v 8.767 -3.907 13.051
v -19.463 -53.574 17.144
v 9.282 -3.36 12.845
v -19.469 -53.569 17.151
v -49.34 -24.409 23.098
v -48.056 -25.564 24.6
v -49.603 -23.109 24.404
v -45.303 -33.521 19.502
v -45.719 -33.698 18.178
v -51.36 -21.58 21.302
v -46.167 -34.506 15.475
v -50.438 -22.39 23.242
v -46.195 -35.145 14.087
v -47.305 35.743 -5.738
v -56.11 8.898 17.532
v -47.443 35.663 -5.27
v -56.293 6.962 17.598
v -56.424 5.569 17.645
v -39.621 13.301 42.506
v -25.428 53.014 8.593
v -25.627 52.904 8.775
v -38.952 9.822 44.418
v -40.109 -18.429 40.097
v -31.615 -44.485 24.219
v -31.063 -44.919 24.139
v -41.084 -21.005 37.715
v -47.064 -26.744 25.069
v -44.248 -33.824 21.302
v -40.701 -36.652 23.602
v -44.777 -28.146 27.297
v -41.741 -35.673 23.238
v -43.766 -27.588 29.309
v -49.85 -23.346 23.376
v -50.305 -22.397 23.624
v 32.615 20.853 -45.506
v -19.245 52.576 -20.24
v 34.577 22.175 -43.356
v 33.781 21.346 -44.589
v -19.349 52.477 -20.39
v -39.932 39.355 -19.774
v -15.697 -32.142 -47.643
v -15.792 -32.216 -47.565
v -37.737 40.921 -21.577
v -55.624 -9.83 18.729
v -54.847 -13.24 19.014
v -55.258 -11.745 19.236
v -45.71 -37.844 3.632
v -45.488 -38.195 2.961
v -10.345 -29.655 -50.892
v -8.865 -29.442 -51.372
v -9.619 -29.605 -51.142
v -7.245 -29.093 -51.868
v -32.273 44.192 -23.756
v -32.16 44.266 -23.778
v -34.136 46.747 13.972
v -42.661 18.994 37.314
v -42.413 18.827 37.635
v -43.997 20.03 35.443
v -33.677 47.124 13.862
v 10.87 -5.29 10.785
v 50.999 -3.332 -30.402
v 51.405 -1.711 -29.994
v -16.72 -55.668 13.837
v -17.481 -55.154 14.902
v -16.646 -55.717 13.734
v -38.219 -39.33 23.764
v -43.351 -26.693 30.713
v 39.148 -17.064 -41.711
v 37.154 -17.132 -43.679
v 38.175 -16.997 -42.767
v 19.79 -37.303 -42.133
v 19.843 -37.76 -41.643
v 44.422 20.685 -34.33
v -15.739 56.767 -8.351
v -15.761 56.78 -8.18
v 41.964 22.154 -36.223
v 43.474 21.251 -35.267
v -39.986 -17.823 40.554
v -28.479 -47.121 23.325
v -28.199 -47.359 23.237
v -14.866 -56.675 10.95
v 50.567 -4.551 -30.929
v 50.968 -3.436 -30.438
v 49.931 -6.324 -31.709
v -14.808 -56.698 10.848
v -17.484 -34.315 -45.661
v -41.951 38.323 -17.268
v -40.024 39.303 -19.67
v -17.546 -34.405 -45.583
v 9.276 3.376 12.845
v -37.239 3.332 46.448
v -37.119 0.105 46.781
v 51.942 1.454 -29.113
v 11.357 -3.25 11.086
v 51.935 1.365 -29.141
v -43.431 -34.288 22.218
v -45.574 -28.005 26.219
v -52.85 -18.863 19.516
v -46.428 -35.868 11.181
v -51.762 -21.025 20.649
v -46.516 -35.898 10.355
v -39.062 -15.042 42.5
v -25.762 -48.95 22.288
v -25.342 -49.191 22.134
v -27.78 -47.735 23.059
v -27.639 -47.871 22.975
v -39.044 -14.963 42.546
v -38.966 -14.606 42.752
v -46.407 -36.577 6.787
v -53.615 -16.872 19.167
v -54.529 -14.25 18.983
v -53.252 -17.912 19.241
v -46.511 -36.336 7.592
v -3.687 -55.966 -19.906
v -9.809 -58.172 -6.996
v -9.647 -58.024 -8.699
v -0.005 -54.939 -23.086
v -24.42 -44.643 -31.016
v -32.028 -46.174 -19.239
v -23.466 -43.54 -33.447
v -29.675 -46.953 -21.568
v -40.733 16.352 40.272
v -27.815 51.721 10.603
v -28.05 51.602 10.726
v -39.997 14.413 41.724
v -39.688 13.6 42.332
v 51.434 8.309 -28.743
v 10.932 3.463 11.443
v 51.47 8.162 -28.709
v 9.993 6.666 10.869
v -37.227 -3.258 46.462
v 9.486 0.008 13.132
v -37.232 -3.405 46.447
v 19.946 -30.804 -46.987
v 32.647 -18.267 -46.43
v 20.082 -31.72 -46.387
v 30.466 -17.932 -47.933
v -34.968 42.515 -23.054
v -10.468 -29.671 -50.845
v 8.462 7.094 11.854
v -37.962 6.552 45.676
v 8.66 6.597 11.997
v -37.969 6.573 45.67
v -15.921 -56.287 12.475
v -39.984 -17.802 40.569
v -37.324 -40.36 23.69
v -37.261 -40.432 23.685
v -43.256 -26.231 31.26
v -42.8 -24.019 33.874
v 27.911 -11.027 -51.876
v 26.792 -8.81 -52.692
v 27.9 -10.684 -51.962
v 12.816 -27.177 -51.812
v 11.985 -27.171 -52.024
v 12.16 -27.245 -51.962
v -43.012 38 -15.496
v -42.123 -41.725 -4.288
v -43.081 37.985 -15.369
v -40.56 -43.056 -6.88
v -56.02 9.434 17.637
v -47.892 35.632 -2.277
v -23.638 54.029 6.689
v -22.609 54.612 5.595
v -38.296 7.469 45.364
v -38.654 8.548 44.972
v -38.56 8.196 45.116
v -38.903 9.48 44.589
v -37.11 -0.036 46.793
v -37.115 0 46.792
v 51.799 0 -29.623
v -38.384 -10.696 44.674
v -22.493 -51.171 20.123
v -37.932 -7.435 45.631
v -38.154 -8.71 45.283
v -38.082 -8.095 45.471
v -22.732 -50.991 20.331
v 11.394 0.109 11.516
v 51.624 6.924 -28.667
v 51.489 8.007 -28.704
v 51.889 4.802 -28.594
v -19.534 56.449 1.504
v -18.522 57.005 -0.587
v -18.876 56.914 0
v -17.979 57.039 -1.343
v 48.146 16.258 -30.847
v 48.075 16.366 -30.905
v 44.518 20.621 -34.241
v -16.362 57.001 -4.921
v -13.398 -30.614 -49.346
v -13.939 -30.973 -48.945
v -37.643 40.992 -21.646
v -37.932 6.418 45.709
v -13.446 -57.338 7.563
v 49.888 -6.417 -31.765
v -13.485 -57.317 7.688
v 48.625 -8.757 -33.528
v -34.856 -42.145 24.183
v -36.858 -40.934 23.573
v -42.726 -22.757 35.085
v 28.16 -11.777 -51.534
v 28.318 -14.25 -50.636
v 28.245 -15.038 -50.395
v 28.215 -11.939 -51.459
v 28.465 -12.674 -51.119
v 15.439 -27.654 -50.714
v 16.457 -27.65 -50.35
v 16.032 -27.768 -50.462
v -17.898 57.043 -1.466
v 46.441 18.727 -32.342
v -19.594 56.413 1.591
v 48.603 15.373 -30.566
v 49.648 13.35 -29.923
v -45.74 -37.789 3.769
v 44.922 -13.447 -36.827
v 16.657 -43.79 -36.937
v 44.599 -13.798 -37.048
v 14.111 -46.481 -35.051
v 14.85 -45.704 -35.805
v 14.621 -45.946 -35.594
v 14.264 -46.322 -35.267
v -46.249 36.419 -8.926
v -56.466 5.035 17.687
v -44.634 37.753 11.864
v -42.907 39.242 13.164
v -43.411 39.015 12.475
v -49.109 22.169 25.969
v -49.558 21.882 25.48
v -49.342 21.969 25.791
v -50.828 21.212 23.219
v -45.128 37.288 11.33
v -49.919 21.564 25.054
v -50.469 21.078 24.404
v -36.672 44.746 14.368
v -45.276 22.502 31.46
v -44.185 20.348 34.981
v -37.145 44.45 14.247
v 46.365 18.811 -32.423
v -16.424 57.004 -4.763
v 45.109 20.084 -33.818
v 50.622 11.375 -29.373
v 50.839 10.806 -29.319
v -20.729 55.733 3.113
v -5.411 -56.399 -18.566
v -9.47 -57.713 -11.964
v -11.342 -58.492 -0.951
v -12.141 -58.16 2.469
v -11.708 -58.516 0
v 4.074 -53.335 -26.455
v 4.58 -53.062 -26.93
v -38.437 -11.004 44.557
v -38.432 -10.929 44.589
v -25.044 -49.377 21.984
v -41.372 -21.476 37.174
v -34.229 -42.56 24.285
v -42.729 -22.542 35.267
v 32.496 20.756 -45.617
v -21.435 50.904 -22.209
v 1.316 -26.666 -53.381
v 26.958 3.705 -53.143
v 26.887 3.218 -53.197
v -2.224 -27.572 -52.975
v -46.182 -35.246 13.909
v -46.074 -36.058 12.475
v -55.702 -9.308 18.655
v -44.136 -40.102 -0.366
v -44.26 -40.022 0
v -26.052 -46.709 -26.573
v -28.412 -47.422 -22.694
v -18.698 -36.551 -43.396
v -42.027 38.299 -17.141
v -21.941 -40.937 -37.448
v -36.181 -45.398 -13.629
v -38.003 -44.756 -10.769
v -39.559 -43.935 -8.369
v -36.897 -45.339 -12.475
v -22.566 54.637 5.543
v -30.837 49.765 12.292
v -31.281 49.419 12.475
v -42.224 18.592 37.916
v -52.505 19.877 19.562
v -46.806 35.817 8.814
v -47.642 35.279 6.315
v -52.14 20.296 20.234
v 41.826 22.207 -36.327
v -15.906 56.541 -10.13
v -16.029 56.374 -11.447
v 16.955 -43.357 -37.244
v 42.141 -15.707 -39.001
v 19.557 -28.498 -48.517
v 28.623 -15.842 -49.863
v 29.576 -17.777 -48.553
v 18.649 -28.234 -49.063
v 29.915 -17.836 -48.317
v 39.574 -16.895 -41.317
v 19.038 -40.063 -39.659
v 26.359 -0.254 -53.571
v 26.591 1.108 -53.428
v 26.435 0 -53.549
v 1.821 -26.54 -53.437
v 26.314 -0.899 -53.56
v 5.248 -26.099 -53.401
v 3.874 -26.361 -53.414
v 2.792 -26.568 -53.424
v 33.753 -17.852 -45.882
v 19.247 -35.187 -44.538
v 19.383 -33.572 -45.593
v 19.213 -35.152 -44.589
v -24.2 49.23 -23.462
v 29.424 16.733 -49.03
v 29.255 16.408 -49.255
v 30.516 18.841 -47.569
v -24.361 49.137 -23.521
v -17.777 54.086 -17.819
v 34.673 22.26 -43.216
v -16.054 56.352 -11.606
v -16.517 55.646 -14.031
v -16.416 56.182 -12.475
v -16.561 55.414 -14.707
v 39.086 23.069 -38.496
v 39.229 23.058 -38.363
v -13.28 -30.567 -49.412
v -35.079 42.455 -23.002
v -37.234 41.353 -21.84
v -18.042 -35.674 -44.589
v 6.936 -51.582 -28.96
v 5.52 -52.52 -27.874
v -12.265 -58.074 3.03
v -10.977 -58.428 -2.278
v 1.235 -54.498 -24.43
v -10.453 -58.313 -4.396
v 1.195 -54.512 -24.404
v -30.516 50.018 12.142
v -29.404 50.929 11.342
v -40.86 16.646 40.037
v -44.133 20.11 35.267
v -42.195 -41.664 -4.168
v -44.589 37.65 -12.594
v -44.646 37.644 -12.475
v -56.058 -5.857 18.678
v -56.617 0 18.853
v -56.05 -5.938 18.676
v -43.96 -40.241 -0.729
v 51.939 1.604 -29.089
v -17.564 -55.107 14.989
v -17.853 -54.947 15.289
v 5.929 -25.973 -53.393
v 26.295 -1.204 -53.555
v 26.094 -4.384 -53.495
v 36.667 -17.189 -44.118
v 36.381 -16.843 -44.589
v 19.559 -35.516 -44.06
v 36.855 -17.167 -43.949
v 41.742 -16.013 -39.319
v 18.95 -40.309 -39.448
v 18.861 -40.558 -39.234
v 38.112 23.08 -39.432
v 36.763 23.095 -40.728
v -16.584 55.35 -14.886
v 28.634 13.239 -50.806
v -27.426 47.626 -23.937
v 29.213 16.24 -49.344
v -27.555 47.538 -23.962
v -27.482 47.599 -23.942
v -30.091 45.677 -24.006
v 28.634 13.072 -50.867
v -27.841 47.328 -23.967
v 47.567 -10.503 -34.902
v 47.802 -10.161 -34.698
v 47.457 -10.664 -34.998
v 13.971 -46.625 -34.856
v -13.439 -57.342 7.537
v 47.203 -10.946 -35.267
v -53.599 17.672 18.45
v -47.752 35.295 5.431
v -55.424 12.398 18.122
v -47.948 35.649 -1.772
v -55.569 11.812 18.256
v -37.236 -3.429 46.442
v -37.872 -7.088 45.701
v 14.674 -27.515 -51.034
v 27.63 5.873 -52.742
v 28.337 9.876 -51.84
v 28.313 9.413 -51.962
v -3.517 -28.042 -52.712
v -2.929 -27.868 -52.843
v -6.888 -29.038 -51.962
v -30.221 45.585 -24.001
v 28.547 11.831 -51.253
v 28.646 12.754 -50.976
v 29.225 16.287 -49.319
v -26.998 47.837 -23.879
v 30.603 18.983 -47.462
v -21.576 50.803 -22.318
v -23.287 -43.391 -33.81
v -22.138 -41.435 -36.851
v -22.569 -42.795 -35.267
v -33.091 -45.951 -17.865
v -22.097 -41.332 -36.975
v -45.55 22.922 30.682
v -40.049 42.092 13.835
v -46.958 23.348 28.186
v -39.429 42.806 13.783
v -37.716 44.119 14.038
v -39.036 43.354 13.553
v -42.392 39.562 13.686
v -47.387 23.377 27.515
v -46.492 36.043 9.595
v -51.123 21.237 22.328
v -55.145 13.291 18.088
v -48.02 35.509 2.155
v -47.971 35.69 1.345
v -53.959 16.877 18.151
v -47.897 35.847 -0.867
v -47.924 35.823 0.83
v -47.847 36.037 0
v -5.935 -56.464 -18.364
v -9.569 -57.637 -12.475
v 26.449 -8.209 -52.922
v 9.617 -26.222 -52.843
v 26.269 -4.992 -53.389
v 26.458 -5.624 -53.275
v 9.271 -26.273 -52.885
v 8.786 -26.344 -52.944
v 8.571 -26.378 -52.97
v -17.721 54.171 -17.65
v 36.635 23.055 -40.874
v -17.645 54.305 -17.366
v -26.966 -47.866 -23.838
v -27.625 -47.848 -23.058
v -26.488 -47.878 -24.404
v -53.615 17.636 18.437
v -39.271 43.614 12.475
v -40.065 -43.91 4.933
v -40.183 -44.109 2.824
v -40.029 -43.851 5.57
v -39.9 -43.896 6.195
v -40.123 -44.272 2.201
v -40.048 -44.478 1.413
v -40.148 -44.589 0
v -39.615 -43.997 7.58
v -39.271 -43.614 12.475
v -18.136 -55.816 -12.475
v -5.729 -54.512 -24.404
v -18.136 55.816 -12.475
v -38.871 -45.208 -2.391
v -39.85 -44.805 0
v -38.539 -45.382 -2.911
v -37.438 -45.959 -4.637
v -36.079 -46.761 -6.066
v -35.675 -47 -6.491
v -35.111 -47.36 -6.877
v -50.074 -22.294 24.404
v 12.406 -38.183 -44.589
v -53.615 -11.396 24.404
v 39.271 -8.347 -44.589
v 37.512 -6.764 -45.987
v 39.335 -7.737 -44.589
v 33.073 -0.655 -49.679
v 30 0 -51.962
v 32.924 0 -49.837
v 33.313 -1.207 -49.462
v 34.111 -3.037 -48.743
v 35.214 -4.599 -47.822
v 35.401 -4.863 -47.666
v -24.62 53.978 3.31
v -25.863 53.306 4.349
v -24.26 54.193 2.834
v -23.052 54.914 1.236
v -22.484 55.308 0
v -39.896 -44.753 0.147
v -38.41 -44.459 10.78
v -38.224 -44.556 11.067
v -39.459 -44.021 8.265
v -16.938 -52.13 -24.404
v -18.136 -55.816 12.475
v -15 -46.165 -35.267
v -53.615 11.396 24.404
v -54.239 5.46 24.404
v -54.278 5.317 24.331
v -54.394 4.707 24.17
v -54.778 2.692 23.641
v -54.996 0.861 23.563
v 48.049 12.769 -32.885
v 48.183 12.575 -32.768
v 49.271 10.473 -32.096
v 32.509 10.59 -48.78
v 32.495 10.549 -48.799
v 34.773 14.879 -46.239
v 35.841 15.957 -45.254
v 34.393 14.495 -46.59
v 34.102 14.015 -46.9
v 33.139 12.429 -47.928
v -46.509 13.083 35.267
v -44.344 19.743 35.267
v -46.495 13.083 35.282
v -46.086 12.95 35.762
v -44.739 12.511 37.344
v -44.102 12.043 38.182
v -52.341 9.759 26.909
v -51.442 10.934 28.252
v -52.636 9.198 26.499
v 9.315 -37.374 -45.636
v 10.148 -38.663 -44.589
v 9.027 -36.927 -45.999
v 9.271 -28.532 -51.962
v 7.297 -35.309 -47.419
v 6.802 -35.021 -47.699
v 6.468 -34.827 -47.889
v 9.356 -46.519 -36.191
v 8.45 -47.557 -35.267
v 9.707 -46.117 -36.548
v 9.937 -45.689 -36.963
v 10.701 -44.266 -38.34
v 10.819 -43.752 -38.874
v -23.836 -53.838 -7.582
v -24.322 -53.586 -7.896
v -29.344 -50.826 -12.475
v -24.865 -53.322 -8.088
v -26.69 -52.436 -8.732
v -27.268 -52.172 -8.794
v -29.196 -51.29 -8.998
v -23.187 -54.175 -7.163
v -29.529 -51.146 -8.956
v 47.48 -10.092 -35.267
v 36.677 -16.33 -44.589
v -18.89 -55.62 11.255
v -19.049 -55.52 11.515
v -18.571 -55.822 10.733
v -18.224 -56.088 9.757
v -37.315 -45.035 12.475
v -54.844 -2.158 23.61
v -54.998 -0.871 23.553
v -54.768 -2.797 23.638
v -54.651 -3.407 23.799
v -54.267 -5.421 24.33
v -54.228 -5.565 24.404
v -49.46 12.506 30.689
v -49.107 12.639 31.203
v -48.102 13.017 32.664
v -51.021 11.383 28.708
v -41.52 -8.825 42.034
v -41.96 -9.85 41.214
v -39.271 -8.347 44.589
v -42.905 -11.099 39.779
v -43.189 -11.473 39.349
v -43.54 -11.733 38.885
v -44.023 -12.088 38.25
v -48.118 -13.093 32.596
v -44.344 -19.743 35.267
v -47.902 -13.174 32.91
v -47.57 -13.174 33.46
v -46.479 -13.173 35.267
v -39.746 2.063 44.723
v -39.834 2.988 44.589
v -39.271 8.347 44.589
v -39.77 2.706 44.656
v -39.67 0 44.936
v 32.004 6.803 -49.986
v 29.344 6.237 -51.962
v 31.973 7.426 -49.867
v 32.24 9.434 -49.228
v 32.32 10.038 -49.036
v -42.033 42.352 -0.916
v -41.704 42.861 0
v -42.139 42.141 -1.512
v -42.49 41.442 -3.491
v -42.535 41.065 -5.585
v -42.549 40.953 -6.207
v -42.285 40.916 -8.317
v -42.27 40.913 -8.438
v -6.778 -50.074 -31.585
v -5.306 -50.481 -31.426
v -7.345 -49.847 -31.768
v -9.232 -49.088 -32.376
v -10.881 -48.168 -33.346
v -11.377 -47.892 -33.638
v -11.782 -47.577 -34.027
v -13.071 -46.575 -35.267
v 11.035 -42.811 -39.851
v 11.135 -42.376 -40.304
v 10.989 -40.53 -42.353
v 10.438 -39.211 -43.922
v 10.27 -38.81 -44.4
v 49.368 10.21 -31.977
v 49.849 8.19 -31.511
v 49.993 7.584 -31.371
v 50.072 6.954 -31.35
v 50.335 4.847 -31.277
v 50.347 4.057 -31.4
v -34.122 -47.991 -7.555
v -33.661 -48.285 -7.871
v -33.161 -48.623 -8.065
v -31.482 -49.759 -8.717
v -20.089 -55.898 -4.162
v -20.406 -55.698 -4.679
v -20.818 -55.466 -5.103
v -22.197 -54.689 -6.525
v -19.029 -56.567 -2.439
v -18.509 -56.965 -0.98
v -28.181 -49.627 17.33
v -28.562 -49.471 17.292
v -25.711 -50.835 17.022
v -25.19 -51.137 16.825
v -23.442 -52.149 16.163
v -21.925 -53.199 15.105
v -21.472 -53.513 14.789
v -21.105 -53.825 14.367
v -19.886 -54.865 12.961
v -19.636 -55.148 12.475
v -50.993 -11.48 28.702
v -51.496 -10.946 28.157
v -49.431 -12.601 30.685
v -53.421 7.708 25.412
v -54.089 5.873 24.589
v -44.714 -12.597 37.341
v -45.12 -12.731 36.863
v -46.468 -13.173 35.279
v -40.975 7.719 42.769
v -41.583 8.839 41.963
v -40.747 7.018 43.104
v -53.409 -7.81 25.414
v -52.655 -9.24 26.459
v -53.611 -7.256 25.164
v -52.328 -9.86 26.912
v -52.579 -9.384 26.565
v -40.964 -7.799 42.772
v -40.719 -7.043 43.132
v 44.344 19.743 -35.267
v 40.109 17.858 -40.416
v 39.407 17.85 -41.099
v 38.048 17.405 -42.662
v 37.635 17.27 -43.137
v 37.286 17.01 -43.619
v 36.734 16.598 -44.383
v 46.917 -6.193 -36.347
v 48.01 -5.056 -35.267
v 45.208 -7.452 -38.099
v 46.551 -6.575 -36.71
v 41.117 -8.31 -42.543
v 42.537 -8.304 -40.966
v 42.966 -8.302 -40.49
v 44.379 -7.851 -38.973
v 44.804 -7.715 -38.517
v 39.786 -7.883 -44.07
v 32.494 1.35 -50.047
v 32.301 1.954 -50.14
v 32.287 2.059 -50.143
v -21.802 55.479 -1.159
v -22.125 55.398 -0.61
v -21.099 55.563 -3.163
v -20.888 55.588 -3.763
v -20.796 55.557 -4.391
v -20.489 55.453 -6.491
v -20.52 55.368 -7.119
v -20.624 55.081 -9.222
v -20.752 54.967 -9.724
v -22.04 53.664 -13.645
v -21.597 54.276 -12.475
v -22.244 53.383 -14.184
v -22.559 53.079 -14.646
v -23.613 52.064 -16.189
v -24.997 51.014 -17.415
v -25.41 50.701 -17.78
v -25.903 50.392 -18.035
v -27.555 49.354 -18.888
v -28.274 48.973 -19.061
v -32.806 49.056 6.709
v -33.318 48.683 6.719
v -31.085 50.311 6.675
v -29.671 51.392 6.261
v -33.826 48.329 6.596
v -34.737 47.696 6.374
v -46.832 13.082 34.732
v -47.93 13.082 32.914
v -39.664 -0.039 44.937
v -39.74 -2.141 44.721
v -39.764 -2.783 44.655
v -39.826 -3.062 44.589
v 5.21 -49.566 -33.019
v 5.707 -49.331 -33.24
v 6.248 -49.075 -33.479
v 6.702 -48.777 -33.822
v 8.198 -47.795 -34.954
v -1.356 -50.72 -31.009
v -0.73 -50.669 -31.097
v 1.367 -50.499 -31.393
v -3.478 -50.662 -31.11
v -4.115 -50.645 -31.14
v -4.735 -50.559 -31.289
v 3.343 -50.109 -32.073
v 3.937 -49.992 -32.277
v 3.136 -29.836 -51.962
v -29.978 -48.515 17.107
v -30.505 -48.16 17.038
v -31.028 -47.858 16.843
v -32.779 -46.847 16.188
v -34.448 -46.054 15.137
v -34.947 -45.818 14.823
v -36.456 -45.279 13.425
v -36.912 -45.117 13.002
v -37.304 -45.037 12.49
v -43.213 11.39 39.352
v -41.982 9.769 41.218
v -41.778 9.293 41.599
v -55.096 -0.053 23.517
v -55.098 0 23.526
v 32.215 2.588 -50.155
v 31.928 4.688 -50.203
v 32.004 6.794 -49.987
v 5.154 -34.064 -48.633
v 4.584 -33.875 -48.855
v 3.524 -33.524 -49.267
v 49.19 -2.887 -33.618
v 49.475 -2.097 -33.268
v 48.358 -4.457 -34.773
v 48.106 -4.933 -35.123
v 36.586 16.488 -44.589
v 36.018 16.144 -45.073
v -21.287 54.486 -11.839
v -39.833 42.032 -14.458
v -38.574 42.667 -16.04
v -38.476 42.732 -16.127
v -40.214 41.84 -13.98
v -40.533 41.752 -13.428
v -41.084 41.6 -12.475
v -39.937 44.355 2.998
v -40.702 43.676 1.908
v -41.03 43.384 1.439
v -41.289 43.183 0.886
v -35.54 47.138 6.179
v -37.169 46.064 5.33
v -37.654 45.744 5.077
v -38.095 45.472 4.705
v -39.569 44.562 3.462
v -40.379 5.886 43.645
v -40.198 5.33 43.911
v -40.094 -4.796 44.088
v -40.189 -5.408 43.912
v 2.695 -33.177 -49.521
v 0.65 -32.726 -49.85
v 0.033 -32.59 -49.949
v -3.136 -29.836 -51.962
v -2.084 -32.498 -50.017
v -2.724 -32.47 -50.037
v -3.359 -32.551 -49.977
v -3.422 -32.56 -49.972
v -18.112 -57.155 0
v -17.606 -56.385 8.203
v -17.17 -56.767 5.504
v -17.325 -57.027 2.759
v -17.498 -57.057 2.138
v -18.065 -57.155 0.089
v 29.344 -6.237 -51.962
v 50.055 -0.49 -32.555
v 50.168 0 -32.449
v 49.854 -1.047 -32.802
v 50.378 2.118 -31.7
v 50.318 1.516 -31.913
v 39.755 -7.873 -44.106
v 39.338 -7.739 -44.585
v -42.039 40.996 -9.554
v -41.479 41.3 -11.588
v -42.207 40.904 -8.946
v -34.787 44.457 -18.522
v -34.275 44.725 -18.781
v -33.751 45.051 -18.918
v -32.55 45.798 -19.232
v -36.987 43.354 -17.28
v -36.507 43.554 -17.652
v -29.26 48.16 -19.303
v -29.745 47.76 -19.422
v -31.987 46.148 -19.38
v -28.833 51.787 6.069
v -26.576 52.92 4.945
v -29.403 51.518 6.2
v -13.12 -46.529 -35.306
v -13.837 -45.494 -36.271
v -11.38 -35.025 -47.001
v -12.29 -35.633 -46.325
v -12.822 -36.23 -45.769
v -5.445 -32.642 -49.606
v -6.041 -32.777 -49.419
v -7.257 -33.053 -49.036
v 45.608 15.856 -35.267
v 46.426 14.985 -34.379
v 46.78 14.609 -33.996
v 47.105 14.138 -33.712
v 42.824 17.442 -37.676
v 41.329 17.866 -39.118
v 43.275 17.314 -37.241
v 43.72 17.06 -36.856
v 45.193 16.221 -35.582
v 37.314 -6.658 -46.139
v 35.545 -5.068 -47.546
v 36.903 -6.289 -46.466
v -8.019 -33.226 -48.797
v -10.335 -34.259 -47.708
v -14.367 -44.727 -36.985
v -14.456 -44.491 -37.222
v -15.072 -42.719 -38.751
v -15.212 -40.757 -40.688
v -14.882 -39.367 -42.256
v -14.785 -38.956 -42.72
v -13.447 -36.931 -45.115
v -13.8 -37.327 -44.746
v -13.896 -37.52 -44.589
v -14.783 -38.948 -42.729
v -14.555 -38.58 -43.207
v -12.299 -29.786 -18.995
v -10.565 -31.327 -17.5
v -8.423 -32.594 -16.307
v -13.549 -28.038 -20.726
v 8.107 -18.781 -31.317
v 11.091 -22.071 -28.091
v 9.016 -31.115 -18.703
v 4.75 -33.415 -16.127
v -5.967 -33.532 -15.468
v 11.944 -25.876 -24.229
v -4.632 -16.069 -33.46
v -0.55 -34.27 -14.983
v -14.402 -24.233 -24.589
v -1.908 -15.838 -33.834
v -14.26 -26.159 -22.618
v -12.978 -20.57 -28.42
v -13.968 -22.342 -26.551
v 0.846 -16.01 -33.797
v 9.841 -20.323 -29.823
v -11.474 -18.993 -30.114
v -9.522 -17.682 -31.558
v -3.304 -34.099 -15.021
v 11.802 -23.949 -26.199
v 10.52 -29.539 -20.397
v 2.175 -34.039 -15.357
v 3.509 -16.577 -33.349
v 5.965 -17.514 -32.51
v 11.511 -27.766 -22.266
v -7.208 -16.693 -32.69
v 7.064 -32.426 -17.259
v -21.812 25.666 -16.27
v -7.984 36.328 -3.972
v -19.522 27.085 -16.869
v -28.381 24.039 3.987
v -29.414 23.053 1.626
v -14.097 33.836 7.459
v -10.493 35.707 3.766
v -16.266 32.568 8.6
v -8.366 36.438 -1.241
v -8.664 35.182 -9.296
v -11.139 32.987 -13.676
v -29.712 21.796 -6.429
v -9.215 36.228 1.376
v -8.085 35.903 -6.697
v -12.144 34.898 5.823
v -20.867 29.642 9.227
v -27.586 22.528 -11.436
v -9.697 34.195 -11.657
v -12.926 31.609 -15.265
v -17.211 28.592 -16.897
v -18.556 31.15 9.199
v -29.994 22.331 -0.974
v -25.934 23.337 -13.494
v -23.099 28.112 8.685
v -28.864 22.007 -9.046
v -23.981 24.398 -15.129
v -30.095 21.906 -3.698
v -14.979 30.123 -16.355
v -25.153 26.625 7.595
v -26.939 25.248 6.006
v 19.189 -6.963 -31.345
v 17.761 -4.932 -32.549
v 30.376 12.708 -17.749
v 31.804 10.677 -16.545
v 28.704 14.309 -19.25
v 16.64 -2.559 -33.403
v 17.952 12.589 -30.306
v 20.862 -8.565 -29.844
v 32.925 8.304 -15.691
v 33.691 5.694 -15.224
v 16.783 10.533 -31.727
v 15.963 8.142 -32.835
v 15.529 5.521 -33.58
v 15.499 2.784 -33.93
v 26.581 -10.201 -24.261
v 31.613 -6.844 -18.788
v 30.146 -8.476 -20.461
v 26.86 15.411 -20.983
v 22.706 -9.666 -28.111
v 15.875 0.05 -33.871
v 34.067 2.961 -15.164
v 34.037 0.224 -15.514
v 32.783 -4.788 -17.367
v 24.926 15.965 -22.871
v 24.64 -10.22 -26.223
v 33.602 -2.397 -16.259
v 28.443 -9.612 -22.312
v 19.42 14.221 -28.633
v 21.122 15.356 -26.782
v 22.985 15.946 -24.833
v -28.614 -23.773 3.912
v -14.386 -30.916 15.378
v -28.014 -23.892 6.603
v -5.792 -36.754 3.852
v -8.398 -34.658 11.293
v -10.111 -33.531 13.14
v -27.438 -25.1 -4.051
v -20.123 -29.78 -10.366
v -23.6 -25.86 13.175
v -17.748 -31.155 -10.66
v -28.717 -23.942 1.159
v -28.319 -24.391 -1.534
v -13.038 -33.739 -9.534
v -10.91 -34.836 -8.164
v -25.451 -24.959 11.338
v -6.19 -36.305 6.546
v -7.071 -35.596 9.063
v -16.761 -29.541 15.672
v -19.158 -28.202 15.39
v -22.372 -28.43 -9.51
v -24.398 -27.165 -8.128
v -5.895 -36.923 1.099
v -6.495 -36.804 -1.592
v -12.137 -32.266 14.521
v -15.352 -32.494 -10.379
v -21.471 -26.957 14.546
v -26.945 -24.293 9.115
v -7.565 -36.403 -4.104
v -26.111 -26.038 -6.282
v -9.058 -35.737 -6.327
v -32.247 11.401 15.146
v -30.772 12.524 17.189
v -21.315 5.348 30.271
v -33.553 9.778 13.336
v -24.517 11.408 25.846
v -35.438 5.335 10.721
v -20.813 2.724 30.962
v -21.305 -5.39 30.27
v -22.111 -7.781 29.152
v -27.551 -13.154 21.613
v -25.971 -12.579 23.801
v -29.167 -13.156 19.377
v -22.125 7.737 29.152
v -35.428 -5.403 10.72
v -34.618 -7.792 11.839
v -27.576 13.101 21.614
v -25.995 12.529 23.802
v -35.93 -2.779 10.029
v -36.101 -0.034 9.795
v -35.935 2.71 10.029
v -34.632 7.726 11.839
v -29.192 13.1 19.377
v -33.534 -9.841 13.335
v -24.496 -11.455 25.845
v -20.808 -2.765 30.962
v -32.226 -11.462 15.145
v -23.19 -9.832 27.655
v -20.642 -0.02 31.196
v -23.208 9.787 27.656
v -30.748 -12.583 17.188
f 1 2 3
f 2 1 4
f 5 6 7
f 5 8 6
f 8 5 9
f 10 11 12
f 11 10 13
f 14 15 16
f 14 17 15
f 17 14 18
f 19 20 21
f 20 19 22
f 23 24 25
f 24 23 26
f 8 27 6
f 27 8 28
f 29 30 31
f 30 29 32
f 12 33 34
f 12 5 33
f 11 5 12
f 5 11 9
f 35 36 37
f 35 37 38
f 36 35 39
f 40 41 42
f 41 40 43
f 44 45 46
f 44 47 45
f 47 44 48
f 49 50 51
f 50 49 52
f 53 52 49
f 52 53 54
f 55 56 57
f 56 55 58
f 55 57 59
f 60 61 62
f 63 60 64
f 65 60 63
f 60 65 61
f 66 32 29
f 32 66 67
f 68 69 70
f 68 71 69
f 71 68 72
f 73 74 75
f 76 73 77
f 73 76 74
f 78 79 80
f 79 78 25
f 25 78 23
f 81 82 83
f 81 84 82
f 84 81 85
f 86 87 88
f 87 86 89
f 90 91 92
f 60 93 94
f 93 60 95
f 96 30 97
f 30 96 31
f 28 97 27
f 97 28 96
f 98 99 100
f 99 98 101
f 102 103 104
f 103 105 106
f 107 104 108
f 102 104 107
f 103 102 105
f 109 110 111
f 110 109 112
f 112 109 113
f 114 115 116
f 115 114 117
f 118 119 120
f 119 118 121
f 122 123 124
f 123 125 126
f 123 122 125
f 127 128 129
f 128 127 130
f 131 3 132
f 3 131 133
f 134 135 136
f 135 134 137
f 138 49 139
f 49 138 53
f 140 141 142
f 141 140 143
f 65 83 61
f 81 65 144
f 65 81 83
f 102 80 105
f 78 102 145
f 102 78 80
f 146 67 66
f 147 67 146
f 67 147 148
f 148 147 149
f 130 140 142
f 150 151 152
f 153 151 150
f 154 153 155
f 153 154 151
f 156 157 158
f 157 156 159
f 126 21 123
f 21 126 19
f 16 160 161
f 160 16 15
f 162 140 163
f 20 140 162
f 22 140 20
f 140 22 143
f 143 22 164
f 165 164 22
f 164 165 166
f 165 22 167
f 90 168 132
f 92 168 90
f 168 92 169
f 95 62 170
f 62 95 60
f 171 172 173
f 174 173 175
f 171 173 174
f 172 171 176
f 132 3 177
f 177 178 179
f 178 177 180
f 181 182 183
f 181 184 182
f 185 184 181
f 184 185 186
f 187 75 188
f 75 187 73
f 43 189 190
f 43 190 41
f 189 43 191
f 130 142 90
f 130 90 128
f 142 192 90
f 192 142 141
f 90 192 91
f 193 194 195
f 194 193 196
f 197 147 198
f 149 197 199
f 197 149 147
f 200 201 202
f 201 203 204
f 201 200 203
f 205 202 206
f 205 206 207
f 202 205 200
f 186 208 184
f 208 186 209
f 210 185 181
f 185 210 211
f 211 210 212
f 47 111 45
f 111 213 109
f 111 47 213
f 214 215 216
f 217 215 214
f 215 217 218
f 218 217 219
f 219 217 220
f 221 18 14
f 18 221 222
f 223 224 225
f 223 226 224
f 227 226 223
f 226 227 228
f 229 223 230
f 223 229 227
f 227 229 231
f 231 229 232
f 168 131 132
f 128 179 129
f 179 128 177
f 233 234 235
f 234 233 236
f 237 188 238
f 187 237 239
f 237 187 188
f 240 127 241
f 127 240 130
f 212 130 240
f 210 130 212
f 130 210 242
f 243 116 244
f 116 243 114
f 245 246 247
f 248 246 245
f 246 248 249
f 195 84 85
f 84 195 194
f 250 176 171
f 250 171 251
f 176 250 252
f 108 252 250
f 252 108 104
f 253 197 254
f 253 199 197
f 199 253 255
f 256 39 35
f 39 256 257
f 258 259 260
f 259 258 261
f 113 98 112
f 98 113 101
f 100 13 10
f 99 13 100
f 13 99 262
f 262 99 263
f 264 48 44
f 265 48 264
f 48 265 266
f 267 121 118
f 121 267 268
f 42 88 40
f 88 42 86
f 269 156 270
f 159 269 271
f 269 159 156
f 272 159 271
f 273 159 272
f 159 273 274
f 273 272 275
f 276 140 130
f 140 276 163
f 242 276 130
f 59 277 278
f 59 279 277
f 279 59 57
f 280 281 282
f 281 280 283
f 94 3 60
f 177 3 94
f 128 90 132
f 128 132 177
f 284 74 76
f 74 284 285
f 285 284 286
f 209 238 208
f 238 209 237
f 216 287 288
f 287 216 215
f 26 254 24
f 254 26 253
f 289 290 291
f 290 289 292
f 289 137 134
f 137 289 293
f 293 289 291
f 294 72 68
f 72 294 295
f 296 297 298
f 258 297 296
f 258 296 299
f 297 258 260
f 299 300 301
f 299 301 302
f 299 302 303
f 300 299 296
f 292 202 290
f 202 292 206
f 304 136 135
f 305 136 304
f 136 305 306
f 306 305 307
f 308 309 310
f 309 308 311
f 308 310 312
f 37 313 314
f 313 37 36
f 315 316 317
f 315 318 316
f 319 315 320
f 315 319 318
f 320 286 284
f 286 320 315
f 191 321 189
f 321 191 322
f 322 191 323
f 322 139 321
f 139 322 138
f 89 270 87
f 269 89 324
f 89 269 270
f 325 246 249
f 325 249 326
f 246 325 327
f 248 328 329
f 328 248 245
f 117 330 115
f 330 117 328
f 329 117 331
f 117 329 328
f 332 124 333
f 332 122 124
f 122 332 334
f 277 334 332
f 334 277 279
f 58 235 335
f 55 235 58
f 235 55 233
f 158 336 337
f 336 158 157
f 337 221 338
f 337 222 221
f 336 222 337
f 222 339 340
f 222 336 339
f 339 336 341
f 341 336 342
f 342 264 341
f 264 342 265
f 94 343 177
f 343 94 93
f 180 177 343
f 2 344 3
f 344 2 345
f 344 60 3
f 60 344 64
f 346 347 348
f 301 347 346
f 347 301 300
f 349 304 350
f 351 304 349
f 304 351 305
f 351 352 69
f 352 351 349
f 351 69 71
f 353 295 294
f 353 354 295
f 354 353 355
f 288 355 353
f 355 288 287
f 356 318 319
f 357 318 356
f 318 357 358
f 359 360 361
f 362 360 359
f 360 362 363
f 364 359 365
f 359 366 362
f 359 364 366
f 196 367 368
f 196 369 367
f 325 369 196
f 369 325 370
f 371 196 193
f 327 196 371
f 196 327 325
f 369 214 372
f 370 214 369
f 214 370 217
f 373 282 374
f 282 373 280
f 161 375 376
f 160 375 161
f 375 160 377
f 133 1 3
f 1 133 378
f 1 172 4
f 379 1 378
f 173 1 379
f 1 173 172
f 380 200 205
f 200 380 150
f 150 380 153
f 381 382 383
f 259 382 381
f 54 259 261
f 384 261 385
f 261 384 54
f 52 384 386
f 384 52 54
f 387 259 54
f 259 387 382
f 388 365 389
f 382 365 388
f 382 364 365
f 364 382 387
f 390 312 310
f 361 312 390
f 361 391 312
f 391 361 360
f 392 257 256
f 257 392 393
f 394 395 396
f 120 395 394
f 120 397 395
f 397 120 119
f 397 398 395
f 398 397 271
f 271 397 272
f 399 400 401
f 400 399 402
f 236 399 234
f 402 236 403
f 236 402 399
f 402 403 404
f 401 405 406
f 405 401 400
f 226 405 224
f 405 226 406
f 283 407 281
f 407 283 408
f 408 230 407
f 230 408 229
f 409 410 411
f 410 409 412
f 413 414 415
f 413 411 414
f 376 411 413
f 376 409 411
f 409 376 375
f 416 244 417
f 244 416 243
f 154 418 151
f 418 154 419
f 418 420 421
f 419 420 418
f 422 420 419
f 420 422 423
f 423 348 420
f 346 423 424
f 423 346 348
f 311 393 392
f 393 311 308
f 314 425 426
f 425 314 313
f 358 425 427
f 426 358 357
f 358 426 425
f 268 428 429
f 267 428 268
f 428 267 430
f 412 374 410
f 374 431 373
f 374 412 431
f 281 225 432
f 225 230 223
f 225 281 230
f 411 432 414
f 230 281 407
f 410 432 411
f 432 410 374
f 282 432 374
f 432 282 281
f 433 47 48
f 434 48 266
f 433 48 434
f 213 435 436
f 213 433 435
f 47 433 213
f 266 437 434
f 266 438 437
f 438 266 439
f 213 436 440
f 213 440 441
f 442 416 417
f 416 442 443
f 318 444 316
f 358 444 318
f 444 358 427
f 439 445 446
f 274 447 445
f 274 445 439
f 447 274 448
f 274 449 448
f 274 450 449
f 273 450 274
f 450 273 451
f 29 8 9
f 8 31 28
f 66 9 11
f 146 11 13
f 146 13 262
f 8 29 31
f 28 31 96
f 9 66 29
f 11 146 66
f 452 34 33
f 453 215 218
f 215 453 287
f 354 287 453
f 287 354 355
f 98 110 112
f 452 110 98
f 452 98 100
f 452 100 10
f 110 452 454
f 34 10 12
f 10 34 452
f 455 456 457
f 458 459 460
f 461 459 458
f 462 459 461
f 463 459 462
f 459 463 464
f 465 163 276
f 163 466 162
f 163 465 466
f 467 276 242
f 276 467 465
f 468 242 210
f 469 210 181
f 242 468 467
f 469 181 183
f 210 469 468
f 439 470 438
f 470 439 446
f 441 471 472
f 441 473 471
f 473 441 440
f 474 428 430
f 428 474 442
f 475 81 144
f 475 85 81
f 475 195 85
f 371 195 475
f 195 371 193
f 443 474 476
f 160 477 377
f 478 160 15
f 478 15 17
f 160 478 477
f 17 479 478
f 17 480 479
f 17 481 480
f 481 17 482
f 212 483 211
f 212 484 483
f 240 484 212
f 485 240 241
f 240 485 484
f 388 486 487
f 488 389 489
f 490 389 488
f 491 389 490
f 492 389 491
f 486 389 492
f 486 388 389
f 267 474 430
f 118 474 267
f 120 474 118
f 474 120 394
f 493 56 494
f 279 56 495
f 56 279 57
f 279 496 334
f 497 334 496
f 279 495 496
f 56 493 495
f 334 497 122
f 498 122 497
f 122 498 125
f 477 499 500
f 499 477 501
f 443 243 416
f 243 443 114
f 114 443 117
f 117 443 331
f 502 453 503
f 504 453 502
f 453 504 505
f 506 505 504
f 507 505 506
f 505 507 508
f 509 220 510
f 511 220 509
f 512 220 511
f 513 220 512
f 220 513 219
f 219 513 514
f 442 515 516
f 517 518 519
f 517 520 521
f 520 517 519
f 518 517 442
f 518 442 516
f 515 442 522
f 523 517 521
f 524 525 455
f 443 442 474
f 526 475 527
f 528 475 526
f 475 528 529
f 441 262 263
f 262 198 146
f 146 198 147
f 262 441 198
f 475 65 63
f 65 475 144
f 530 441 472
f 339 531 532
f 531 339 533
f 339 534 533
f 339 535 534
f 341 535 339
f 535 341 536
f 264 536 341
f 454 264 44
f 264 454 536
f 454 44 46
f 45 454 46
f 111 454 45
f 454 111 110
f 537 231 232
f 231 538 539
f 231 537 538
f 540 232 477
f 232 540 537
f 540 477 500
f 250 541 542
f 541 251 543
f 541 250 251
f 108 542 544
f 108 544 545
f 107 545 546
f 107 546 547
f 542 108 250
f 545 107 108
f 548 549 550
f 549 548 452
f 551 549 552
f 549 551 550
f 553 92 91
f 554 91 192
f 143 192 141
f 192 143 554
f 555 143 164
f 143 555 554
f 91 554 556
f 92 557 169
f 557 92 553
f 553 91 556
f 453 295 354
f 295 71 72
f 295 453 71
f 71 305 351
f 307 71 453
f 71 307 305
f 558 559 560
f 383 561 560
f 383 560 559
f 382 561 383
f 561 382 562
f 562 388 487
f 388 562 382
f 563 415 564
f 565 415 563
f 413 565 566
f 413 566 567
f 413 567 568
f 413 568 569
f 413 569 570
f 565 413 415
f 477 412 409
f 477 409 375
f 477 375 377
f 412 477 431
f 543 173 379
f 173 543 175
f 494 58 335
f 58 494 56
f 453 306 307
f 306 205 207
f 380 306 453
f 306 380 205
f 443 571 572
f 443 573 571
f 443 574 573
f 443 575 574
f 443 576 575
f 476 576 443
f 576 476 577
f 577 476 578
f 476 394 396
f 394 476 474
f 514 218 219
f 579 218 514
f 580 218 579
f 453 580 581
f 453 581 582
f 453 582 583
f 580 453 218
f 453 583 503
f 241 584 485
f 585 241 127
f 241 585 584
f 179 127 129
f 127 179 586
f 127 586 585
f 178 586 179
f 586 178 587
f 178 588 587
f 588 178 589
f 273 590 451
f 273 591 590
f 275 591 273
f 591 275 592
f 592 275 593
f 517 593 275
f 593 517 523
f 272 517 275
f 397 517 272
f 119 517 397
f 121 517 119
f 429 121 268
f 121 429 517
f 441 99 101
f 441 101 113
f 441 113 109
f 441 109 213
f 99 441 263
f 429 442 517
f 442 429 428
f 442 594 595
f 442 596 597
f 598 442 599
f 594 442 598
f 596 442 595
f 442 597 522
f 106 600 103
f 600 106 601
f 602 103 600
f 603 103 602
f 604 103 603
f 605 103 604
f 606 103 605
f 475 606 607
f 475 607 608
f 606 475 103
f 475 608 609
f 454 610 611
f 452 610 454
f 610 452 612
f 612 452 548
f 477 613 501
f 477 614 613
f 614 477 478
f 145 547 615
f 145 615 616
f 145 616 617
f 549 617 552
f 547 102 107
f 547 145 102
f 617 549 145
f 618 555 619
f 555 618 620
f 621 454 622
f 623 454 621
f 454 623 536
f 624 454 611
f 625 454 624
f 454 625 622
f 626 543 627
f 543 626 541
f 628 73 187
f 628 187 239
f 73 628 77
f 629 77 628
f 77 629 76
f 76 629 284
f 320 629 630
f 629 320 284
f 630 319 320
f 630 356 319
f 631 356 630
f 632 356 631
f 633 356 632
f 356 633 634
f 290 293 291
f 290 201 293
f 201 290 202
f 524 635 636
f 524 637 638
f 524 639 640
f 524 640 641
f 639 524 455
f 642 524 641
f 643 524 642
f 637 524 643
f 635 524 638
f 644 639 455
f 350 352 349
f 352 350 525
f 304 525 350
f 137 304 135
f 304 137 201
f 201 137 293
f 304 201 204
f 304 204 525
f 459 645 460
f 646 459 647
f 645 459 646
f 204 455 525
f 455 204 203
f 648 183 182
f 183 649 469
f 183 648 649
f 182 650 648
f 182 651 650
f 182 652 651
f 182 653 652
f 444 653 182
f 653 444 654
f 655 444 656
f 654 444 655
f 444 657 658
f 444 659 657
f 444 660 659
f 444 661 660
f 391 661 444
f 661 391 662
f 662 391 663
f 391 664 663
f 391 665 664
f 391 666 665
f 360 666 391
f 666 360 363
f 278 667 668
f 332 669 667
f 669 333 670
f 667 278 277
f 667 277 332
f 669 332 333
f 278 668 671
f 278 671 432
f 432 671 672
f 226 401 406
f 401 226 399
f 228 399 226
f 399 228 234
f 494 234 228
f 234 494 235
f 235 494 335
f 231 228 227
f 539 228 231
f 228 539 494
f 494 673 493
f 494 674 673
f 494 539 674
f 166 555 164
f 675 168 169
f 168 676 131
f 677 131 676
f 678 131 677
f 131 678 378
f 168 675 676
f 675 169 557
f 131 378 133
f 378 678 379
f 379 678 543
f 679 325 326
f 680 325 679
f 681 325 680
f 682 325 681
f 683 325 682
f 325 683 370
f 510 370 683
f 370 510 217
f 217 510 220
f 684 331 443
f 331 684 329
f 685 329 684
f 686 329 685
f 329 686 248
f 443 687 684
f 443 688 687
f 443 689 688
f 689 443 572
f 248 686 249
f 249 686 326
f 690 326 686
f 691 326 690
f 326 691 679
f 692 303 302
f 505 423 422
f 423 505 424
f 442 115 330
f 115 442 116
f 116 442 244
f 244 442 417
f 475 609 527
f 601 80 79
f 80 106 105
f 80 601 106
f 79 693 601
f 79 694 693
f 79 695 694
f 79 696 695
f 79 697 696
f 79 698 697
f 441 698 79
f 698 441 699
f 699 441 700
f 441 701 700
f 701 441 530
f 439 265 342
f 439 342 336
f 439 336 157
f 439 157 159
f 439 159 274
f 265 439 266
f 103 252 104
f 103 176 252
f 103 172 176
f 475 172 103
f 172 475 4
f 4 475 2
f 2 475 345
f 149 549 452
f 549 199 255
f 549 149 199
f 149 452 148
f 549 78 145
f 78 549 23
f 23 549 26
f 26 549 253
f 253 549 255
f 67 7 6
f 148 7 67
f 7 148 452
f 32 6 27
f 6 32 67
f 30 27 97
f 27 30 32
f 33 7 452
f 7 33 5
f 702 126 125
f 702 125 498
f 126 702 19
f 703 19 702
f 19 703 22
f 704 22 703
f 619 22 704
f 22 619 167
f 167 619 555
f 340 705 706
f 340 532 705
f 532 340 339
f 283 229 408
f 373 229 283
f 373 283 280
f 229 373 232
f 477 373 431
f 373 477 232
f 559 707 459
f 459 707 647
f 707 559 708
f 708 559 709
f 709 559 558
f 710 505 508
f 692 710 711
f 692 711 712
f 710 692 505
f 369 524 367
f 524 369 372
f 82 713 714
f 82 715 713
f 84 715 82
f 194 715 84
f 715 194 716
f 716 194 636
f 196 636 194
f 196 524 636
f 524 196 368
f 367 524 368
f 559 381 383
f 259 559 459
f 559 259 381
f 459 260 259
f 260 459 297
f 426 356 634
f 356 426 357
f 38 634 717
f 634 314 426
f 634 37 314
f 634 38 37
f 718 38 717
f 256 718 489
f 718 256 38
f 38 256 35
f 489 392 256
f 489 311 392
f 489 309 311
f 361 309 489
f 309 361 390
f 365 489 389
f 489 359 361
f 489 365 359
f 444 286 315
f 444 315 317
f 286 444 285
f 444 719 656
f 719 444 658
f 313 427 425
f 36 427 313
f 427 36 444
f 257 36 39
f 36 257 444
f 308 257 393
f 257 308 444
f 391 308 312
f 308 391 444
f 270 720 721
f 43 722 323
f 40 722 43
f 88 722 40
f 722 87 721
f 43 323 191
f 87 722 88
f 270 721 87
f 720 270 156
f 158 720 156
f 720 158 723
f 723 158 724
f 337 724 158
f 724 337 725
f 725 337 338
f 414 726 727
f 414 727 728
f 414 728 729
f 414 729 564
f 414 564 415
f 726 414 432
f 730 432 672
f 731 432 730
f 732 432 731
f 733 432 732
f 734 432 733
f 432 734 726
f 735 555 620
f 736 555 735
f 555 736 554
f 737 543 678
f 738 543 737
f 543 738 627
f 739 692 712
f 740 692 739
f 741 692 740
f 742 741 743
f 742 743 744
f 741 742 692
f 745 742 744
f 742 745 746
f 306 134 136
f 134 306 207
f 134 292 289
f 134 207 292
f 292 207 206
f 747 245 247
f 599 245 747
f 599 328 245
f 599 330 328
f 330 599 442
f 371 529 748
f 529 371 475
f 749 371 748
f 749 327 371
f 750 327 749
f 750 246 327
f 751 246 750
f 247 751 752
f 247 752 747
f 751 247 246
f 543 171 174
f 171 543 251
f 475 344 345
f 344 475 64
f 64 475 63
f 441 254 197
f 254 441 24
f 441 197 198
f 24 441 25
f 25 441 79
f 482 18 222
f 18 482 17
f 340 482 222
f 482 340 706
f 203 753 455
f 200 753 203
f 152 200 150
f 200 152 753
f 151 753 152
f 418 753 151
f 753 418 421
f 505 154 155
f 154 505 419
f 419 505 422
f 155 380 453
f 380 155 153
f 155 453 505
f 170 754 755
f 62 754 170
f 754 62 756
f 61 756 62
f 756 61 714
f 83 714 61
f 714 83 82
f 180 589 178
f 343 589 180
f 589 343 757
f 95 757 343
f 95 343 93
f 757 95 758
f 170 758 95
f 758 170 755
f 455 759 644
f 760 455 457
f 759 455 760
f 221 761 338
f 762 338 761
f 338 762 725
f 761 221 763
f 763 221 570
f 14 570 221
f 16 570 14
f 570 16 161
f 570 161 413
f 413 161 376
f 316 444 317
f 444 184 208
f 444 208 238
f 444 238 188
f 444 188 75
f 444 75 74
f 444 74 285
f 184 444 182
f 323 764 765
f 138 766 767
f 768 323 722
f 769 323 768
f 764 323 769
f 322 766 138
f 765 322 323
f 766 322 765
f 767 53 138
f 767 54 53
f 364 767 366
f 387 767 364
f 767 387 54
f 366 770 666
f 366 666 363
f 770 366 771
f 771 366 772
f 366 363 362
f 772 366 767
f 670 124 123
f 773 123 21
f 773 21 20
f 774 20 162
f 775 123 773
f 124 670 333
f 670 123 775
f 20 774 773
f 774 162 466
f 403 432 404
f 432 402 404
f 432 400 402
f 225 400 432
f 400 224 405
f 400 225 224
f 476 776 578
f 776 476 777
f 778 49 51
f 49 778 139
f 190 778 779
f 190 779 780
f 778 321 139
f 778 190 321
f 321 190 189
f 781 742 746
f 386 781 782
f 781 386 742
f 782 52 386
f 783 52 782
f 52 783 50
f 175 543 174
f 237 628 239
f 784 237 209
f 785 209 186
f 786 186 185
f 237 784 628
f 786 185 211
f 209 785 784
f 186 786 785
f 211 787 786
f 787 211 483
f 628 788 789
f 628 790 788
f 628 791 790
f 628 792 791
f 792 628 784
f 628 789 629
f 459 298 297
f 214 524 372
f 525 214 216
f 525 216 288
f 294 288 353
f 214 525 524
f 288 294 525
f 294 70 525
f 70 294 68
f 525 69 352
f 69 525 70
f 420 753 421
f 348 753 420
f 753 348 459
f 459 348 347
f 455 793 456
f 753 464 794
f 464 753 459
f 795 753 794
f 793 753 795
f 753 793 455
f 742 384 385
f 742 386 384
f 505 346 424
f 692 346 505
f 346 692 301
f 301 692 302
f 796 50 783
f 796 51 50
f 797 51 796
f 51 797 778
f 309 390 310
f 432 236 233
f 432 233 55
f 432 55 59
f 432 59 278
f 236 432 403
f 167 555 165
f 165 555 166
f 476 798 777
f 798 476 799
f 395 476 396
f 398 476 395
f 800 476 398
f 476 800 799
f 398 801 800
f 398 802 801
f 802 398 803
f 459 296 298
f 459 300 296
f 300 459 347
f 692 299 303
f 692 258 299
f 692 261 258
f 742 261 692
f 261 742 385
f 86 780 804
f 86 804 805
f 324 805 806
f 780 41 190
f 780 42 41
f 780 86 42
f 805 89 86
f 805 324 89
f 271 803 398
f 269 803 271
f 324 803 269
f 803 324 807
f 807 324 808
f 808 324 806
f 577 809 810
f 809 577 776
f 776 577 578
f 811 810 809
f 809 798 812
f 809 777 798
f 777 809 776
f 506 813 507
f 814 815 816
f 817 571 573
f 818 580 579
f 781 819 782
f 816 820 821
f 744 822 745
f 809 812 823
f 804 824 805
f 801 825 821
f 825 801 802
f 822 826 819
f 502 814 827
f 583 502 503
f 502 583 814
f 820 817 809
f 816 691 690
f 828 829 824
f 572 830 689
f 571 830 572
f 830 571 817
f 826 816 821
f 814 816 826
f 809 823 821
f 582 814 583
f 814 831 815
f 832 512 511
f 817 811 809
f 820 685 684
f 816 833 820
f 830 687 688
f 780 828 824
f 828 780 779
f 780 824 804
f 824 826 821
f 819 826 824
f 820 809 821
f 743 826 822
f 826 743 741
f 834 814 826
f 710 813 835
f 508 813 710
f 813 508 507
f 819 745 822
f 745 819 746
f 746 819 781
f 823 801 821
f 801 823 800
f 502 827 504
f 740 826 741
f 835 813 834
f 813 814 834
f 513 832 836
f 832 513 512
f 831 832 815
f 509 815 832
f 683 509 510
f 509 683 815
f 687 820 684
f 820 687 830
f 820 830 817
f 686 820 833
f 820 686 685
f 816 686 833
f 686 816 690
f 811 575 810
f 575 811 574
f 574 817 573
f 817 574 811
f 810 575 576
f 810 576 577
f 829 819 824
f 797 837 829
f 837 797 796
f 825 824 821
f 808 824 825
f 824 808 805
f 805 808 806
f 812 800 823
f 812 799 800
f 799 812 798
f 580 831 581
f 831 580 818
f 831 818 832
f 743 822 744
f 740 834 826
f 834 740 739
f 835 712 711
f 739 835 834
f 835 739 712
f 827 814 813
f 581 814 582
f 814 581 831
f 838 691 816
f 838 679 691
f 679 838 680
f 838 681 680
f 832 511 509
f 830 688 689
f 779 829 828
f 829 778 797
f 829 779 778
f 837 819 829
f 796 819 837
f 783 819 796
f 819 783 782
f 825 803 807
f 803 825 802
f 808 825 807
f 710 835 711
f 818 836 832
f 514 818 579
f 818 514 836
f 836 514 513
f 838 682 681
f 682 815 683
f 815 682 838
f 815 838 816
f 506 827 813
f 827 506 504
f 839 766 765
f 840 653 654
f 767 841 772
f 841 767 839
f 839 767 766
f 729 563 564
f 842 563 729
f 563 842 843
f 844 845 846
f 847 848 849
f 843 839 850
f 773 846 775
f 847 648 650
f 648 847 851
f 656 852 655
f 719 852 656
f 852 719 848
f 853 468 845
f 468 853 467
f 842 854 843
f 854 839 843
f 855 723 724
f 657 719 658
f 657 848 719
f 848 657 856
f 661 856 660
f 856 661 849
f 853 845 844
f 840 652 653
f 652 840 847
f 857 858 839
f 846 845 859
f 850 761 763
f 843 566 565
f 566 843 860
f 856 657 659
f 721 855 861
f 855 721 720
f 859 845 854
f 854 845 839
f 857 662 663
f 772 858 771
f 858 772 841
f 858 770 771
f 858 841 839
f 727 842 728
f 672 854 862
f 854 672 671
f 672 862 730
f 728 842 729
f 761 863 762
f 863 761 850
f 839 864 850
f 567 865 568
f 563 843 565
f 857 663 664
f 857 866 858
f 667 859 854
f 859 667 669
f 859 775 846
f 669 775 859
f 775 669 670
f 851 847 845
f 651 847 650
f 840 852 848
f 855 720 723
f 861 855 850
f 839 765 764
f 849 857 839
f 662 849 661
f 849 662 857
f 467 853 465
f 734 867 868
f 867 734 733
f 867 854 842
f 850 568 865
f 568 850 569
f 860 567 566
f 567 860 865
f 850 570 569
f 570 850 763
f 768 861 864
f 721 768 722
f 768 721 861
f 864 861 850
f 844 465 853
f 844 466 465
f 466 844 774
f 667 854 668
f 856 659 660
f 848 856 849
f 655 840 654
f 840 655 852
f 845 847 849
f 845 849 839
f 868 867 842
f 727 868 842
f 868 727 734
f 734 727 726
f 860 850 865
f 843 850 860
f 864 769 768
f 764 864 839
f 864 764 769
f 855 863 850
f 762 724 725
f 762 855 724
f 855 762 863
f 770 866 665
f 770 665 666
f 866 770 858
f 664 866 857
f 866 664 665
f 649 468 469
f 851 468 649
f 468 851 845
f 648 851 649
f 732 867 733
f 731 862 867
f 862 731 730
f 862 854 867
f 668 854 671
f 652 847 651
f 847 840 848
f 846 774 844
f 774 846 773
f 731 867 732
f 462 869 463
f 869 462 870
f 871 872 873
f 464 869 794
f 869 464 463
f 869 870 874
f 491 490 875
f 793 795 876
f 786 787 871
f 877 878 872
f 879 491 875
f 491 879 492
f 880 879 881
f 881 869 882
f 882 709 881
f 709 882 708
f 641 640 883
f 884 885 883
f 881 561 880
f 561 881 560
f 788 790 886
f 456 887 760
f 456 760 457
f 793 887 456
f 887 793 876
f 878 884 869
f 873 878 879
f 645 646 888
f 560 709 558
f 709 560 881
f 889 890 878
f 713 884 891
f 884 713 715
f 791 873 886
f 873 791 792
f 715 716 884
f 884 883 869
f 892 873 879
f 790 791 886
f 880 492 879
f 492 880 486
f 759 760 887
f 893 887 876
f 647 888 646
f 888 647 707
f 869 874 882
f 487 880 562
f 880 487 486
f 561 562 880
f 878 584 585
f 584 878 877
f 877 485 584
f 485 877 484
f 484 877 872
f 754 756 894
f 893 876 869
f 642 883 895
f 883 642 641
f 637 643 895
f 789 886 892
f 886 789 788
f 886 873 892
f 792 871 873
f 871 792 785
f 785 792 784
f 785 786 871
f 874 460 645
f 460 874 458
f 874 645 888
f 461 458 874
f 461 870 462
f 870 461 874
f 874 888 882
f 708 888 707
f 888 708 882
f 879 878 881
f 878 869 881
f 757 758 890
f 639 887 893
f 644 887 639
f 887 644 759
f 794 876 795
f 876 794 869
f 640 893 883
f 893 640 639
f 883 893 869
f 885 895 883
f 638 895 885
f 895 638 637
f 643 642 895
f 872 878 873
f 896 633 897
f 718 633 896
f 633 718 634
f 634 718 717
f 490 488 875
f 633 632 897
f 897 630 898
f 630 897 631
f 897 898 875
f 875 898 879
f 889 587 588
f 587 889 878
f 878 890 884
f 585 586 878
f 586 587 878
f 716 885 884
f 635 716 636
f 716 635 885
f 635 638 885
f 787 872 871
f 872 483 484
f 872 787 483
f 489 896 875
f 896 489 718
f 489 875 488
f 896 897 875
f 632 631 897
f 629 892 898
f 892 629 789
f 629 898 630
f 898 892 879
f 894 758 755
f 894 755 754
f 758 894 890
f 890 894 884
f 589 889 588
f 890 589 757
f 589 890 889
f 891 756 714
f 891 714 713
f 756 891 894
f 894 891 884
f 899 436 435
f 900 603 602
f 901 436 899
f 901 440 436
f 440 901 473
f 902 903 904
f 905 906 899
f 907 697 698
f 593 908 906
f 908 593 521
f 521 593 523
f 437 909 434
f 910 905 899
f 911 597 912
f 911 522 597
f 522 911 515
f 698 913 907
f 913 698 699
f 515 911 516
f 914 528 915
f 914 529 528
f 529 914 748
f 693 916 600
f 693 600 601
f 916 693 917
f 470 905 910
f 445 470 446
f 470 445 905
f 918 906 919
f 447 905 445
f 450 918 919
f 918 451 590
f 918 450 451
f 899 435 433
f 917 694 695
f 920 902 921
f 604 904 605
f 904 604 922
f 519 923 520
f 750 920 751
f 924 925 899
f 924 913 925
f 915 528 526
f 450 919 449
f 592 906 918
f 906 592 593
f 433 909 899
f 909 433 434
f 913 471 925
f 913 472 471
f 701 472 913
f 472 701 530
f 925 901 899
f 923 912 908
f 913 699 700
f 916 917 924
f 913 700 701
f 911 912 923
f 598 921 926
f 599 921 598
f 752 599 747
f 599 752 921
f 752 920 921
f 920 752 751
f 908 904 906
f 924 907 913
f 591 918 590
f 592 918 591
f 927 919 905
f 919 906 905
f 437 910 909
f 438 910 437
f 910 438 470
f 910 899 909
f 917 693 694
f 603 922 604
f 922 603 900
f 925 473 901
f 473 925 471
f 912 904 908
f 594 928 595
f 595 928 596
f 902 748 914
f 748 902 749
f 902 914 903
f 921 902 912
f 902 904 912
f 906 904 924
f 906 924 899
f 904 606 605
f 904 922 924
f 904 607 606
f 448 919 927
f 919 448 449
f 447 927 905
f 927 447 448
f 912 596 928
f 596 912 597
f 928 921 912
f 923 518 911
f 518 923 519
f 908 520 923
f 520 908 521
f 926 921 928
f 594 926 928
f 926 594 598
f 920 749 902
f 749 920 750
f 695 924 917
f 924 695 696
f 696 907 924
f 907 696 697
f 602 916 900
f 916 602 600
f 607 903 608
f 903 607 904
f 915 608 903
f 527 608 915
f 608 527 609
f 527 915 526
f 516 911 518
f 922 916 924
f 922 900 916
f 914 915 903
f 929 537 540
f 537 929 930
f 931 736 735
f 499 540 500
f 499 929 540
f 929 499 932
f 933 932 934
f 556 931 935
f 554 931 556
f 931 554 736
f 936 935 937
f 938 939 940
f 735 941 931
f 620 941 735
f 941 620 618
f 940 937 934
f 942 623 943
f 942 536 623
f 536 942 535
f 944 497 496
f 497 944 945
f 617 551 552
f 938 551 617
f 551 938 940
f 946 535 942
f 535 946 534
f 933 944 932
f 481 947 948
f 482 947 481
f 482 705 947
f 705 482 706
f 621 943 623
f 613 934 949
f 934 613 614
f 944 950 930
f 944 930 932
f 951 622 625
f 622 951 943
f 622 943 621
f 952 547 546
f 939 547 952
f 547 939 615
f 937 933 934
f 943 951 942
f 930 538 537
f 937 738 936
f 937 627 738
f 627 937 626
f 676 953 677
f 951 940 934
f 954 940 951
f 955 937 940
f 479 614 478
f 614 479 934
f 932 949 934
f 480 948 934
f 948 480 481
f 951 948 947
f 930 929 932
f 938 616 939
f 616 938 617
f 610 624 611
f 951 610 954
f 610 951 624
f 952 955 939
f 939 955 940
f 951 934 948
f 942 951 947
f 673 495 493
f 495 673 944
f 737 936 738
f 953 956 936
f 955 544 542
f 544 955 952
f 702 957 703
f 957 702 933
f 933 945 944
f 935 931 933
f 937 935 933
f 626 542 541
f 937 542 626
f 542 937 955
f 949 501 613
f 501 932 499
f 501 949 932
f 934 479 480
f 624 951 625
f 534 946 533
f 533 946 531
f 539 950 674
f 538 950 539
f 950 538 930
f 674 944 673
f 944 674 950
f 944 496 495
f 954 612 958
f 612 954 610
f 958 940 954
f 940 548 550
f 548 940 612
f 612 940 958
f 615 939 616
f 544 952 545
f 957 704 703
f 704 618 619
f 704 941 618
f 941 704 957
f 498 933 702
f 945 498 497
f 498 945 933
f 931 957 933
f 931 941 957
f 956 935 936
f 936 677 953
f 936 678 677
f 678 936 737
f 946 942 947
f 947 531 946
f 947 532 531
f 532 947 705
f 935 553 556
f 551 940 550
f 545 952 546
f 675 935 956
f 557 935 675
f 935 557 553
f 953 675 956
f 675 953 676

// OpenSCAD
difference() {
	intersection() {
		hull() {
			rotate(a = -118.9051365199, v = [0.4336068963, -0.7604915073, 0.0000000000]) {
				rotate(a = -90.0000000000, v = [-0.1305261922, -0.9914448614, 0.0000000000]) {
					cylinder(h = 60, r = 16.2000000000);
				}
			}
			rotate(a = -118.9051365199, v = [0.4336068963, -0.7604915073, 0.0000000000]) {
				rotate(a = -90.0000000000, v = [0.9238795325, 0.3826834324, -0.0000000000]) {
					cylinder(h = 60, r = 16.2000000000);
				}
			}
			rotate(a = -118.9051365199, v = [0.4336068963, -0.7604915073, 0.0000000000]) {
				rotate(a = -24.0657434263, v = [-0.0956376174, -0.3964110704, 0.0000000000]) {
					cylinder(h = 60, r = 16.2000000000);
				}
			}
			rotate(a = -118.9051365199, v = [0.4336068963, -0.7604915073, 0.0000000000]) {
				rotate(a = -141.7661142776, v = [-0.2679213795, -0.5578727405, 0.0000000000]) {
					cylinder(h = 60, r = 16.2000000000);
				}
			}
			rotate(a = -118.9051365199, v = [0.4336068963, -0.7604915073, 0.0000000000]) {
				rotate(a = -154.1384175201, v = [0.2629773042, 0.3480116253, -0.0000000000]) {
					cylinder(h = 60, r = 16.2000000000);
				}
			}
		}
		sphere(r = 60);
	}
	union() {
		rotate(a = -118.9051365199, v = [0.4336068963, -0.7604915073, 0.0000000000]) {
			rotate(a = -90.0000000000, v = [-0.1305261922, -0.9914448614, 0.0000000000]) {
				translate(v = [0, 0, 35]) {
					cylinder(h = 100, r = 13.2000000000);
				}
			}
		}
		rotate(a = -118.9051365199, v = [0.4336068963, -0.7604915073, 0.0000000000]) {
			rotate(a = -90.0000000000, v = [0.9238795325, 0.3826834324, -0.0000000000]) {
				translate(v = [0, 0, 35]) {
					cylinder(h = 100, r = 13.2000000000);
				}
			}
		}
		rotate(a = -118.9051365199, v = [0.4336068963, -0.7604915073, 0.0000000000]) {
			rotate(a = -24.0657434263, v = [-0.0956376174, -0.3964110704, 0.0000000000]) {
				translate(v = [0, 0, 35]) {
					cylinder(h = 100, r = 13.2000000000);
				}
			}
		}
		rotate(a = -118.9051365199, v = [0.4336068963, -0.7604915073, 0.0000000000]) {
			rotate(a = -141.7661142776, v = [-0.2679213795, -0.5578727405, 0.0000000000]) {
				translate(v = [0, 0, 35]) {
					cylinder(h = 100, r = 13.2000000000);
				}
			}
		}
		rotate(a = -118.9051365199, v = [0.4336068963, -0.7604915073, 0.0000000000]) {
			rotate(a = -154.1384175201, v = [0.2629773042, 0.3480116253, -0.0000000000]) {
				translate(v = [0, 0, 35]) {
					cylinder(h = 100, r = 13.2000000000);
				}
			}
		}
	}
}
